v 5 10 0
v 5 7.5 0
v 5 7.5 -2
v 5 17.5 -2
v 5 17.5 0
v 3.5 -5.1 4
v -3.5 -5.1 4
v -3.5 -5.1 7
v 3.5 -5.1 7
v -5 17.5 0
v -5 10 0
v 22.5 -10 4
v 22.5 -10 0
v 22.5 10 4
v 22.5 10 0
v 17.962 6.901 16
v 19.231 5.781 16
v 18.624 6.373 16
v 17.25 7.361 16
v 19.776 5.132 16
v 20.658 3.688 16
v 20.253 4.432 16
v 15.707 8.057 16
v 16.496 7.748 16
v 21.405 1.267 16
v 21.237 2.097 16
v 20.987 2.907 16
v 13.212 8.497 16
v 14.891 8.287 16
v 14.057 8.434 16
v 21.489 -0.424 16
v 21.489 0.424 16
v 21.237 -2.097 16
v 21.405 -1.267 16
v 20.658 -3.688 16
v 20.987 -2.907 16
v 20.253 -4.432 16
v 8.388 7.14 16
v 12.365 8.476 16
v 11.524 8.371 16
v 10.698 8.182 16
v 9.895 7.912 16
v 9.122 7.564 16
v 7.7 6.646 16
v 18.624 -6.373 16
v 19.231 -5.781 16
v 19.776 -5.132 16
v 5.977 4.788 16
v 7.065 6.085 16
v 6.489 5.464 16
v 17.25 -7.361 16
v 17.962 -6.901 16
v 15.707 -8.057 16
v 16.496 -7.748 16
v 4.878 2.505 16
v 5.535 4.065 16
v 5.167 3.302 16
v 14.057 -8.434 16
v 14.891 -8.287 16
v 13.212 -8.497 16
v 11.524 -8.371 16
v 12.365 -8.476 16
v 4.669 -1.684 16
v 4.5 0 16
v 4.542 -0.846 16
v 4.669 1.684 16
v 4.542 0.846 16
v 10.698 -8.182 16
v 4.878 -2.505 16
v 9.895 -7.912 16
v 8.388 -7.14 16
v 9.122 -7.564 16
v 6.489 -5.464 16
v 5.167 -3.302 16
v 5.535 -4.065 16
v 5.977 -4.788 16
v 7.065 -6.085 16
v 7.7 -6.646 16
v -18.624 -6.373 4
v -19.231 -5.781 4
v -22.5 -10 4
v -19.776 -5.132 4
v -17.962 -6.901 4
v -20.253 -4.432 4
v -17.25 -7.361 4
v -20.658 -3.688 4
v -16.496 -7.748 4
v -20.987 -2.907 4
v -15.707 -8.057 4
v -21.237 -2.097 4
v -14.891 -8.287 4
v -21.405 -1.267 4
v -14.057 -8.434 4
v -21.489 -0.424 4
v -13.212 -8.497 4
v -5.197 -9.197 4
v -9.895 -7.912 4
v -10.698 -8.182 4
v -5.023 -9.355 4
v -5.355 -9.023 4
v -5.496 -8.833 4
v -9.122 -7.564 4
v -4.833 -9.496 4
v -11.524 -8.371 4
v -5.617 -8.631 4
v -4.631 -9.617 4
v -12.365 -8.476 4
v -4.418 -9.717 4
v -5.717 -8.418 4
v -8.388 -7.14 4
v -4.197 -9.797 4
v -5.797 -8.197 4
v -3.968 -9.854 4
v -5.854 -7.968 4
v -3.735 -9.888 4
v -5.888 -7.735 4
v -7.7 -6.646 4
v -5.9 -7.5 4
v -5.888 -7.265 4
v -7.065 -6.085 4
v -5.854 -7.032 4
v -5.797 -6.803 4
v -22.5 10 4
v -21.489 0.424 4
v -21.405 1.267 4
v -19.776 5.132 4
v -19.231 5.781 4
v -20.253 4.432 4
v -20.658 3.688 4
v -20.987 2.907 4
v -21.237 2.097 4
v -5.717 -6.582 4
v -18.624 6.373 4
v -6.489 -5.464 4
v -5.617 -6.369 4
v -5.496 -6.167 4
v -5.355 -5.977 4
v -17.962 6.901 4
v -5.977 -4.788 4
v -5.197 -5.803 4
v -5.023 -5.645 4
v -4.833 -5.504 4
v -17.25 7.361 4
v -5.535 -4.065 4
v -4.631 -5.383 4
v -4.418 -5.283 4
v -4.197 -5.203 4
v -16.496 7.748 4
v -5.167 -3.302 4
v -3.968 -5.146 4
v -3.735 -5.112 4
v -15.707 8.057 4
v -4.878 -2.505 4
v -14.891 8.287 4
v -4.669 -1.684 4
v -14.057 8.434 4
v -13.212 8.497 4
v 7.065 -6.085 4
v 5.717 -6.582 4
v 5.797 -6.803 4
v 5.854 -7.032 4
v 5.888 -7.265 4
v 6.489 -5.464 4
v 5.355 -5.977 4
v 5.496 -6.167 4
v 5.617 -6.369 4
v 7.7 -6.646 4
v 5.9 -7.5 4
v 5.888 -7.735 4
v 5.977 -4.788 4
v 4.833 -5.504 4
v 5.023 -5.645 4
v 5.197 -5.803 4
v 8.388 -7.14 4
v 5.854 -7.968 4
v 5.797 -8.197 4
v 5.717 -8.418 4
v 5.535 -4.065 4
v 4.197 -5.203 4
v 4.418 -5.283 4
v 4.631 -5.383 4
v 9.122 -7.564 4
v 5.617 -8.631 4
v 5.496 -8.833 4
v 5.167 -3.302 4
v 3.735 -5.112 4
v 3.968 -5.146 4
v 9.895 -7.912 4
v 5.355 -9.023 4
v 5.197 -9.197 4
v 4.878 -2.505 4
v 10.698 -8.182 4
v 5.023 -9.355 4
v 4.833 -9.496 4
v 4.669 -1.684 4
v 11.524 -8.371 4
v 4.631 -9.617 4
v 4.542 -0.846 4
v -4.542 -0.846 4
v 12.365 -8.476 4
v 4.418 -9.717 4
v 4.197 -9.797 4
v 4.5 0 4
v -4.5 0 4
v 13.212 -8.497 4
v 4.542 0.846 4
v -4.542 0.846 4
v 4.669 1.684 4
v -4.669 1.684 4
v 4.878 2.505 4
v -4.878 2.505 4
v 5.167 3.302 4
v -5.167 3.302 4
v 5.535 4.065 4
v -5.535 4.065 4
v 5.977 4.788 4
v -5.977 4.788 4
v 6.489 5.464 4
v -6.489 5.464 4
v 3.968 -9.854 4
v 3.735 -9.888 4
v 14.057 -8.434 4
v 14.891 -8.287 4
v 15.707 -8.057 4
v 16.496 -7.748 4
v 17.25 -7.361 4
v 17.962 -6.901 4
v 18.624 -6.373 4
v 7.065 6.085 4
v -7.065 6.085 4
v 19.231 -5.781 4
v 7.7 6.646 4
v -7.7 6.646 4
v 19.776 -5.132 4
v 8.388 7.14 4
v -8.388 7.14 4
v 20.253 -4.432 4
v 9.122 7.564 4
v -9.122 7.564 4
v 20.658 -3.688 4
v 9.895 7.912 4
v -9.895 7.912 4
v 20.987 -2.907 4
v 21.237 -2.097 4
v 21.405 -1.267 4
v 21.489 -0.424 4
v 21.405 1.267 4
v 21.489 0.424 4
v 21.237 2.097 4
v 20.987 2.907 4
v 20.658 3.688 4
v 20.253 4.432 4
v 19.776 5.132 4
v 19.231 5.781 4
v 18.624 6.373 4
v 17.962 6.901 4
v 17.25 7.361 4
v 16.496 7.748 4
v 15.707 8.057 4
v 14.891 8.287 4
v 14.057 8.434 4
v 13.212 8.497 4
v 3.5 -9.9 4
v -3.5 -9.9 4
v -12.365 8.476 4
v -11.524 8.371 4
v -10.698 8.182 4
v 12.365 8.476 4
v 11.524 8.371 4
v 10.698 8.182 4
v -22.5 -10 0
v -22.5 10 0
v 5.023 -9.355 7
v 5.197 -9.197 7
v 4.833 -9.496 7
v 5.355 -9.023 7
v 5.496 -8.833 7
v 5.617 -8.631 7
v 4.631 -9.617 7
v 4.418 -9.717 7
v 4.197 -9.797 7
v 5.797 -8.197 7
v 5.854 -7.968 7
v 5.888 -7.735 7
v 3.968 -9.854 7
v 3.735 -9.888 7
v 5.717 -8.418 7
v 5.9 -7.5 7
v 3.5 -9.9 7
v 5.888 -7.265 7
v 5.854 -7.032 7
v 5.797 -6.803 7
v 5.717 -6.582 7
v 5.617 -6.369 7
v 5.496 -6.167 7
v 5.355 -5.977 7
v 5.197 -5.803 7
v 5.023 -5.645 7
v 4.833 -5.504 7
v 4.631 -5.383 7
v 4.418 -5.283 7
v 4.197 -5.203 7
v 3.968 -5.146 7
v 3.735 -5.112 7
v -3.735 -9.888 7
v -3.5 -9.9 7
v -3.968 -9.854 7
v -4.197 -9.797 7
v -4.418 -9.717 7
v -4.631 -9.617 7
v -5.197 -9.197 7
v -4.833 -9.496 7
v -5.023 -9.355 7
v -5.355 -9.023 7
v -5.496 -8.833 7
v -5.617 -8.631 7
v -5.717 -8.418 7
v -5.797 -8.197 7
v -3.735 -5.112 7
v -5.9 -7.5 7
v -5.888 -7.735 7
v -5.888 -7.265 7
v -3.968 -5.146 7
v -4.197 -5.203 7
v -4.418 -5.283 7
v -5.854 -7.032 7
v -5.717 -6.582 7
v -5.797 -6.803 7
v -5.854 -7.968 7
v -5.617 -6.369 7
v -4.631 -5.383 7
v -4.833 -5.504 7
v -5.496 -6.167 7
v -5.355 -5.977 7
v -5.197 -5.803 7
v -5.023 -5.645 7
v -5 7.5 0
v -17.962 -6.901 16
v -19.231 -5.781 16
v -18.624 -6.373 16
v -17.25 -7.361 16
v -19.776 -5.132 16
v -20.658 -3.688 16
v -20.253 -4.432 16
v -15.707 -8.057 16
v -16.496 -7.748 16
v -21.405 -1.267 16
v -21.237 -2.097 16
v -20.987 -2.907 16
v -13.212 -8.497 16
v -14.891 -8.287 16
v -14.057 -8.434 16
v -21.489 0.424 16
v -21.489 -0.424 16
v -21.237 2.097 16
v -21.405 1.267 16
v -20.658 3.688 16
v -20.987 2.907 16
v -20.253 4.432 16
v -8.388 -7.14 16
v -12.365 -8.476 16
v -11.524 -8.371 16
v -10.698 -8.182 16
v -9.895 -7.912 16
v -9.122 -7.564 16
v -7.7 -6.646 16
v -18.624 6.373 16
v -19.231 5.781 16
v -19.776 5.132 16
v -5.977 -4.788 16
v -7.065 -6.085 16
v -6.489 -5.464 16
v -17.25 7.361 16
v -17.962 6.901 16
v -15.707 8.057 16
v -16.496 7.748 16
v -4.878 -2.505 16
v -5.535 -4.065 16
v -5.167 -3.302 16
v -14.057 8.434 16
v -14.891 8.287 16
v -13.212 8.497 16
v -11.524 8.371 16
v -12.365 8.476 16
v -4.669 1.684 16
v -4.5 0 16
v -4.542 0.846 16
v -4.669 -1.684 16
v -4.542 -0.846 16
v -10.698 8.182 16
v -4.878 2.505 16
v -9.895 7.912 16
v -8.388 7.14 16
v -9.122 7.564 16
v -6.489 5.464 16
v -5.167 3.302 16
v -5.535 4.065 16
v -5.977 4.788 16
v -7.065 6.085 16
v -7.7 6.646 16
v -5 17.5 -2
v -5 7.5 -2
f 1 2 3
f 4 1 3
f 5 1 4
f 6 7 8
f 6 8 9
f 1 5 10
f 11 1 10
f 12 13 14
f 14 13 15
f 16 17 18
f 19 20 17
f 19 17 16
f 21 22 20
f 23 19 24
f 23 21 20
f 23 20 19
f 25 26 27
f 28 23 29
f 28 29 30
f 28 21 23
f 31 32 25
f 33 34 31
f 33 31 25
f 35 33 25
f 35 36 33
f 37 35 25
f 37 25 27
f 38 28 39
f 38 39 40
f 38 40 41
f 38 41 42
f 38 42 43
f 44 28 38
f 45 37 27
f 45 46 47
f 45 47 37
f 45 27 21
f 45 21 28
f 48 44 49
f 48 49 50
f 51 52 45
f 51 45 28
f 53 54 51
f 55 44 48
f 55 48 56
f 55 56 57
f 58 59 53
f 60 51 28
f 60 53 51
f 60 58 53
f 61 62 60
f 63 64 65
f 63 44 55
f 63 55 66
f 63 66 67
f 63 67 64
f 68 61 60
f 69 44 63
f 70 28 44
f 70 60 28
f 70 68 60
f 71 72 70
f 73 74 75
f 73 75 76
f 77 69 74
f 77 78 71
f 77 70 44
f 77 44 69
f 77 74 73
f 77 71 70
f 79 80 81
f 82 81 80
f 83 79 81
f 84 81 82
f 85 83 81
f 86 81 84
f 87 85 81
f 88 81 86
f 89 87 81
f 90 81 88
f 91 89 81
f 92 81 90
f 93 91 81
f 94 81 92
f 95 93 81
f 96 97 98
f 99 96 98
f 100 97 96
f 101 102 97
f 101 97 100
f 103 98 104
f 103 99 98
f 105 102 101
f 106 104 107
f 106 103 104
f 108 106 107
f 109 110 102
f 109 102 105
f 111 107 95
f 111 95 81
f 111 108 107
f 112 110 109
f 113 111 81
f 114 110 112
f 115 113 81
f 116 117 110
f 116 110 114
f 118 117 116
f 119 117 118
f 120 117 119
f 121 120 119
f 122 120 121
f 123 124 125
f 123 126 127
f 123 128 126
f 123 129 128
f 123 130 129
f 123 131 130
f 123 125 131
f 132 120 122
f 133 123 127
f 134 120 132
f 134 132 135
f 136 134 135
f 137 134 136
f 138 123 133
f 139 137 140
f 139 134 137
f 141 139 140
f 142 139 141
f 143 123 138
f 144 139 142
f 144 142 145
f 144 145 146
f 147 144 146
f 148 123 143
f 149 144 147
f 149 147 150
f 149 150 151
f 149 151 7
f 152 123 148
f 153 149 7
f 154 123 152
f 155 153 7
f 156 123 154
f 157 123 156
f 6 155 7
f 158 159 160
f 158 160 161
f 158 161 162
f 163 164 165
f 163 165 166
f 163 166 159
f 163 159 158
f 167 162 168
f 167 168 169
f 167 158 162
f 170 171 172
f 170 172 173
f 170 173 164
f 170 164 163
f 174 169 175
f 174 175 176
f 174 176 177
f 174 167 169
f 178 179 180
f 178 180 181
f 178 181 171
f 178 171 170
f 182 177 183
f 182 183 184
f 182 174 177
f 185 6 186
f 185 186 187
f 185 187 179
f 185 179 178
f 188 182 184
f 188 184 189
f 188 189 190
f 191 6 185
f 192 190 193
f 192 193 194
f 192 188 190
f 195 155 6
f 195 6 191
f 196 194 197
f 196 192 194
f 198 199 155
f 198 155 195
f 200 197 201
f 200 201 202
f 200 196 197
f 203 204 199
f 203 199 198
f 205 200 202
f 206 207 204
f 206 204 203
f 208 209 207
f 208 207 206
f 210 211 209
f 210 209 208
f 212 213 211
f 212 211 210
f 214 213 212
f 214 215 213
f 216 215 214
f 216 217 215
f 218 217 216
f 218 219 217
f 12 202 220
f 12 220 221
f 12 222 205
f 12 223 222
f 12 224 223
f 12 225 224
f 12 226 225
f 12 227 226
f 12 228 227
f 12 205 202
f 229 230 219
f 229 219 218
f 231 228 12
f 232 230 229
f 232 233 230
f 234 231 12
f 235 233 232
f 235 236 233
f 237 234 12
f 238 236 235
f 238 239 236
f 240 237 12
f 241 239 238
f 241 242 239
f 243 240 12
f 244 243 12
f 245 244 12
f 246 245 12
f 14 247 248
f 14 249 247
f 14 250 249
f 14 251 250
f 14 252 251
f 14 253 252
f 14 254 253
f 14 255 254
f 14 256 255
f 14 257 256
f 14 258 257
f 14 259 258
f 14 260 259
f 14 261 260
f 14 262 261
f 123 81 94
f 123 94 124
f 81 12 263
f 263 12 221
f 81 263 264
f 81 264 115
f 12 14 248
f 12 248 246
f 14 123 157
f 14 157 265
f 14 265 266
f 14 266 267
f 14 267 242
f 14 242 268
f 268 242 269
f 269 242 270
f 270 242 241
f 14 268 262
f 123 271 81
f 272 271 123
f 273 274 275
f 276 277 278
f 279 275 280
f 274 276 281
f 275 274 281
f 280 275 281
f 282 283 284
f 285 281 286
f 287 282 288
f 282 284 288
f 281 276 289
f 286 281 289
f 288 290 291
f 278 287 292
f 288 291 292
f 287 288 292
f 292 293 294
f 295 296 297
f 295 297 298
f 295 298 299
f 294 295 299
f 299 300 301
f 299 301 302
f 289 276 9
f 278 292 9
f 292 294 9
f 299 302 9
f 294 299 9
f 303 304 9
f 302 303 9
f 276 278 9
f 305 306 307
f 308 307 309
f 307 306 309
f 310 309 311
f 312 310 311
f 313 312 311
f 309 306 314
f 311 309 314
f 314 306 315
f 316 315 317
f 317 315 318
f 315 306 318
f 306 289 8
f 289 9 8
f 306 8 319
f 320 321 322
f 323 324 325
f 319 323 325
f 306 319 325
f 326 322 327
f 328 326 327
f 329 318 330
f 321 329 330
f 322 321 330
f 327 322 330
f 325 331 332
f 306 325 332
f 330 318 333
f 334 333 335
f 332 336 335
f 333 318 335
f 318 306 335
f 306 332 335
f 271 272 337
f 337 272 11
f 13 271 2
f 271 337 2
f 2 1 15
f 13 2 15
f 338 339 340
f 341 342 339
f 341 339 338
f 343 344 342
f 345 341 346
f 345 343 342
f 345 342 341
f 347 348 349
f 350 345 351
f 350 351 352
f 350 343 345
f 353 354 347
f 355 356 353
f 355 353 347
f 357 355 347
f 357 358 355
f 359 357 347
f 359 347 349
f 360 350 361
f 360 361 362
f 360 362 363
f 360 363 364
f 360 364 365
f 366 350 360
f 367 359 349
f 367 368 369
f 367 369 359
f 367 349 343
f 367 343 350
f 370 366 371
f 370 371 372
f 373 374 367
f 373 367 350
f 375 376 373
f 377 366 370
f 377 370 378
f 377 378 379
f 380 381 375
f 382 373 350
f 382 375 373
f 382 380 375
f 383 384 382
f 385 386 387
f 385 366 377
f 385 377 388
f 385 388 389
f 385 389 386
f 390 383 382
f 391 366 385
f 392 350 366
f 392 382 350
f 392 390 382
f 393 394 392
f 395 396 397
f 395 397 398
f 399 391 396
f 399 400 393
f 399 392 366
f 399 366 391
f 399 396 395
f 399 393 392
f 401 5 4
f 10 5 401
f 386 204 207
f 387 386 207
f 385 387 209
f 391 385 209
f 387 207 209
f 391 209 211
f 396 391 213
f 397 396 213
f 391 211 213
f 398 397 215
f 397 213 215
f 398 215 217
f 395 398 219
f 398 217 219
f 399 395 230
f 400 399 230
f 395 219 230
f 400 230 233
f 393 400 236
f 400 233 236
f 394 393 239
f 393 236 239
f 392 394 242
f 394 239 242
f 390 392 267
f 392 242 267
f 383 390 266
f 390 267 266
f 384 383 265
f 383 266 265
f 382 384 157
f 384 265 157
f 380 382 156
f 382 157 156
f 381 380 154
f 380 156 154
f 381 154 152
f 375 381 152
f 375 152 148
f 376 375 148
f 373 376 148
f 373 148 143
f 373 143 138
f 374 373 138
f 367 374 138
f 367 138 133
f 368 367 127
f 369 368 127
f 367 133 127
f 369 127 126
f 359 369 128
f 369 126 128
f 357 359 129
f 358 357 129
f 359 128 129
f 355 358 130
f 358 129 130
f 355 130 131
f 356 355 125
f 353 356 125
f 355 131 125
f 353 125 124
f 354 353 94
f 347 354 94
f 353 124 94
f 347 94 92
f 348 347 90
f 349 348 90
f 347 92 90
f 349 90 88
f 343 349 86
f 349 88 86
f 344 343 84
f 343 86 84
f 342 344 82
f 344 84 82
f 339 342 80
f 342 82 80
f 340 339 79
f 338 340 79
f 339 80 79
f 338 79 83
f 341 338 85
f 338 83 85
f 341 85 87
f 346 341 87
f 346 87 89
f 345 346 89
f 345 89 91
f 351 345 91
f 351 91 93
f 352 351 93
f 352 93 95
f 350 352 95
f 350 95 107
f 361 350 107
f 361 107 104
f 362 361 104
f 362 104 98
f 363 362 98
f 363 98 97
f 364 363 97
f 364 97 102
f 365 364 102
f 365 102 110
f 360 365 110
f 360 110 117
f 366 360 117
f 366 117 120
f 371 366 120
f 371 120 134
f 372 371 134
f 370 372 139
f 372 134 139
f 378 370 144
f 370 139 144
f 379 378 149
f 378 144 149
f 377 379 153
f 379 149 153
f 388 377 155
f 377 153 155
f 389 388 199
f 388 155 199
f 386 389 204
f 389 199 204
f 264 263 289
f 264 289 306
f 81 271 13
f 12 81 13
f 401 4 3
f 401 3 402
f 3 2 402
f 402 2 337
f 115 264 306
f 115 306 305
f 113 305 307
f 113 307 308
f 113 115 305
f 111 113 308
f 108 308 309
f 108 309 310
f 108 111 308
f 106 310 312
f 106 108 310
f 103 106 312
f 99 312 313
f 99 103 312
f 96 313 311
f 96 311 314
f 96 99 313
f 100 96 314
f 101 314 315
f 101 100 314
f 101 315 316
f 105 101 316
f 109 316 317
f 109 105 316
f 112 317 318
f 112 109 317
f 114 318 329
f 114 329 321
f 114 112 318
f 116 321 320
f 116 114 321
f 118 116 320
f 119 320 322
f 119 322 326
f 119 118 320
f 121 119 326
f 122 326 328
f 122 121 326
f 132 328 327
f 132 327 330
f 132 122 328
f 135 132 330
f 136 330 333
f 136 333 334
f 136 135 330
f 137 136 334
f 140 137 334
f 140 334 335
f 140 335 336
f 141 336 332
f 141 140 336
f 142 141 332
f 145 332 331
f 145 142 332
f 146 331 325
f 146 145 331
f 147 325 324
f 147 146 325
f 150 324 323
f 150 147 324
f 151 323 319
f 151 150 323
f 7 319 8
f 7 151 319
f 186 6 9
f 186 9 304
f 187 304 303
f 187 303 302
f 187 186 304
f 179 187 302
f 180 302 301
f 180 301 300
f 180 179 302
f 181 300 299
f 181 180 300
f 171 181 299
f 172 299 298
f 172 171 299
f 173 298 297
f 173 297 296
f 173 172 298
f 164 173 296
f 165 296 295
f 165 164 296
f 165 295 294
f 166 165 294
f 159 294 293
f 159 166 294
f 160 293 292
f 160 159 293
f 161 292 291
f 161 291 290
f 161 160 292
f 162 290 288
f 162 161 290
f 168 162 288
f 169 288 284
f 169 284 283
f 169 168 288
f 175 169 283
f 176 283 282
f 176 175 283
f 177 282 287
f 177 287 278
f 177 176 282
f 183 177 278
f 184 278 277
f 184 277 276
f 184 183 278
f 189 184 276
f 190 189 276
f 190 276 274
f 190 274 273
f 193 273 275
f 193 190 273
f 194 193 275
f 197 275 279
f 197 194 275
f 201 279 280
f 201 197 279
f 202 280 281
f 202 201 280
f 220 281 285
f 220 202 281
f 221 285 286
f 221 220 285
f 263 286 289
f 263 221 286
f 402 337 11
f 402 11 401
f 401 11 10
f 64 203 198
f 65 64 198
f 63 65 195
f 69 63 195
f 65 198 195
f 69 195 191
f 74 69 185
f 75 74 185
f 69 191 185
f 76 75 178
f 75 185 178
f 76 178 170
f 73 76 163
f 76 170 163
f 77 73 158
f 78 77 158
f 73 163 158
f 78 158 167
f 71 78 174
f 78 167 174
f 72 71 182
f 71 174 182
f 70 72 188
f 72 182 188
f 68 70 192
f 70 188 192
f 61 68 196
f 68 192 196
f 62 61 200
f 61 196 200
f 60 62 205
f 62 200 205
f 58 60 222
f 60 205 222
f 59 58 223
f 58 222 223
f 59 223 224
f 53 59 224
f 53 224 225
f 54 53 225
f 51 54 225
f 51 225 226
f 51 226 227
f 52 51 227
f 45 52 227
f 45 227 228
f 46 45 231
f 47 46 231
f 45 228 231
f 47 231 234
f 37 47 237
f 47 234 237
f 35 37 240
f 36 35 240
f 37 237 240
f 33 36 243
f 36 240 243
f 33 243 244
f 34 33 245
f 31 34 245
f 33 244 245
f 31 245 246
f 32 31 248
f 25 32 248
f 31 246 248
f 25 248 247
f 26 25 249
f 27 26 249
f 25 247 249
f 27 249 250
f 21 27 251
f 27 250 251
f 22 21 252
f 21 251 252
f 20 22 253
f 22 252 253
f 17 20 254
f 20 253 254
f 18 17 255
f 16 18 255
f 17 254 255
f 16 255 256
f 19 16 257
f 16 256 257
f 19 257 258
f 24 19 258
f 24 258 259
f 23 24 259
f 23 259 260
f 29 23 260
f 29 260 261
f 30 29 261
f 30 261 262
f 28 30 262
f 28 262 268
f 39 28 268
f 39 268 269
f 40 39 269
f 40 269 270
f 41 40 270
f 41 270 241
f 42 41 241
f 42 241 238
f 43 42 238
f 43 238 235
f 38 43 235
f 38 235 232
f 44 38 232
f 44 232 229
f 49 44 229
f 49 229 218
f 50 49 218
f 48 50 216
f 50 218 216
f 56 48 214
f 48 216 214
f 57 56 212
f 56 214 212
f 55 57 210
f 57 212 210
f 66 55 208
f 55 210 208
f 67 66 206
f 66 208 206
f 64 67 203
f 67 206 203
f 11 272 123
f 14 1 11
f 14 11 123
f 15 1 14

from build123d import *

# Parameters (mm, degrees)
SKETCH1_W           = 45
SKETCH1_H           = 20
BOSS_EXTRUDE1_DEPTH = 4
SKETCH2_W           = 10
SKETCH2_H           = 10
BOSS_EXTRUDE2_DEPTH = 2
SKETCH3_R           = 8.5
BOSS_EXTRUDE3_DEPTH = 12
BOSS_EXTRUDE4_DEPTH = 3


with BuildPart() as part:
    # Sketch1 → Boss-Extrude1 (new body)
    with BuildSketch(Plane.XY):
        Rectangle(SKETCH1_W, SKETCH1_H)
    extrude(amount=BOSS_EXTRUDE1_DEPTH)

    # Sketch2 → Boss-Extrude2 (add)
    with BuildSketch(Plane(origin=(0, 0, 0), x_dir=(-1, 0, 0), z_dir=(0, 0, -1))):
        with Locations((0, 12.5)):
            Rectangle(SKETCH2_W, SKETCH2_H)
    extrude(amount=BOSS_EXTRUDE2_DEPTH)

    # Sketch3 → Boss-Extrude3 (add)
    with BuildSketch(Plane.XY.offset(4)):
        with Locations((-13, 0)):
            Circle(SKETCH3_R)
        with Locations(Location((13, 0, 0), (0, 0, 180))):
            Circle(SKETCH3_R)
    extrude(amount=BOSS_EXTRUDE3_DEPTH)

    # Sketch4 → Boss-Extrude4 (add)
    with BuildSketch(Plane.XY.offset(4)):
        with BuildLine():
            Line((3.5, -9.9), (-3.5, -9.9))
            ThreePointArc((-3.5, -9.9), (-5.9, -7.5), (-3.5, -5.1))
            Line((-3.5, -5.1), (3.5, -5.1))
            ThreePointArc((3.5, -5.1), (5.9, -7.5), (3.5, -9.9))
        make_face()
    extrude(amount=BOSS_EXTRUDE4_DEPTH)


solid = part.part
